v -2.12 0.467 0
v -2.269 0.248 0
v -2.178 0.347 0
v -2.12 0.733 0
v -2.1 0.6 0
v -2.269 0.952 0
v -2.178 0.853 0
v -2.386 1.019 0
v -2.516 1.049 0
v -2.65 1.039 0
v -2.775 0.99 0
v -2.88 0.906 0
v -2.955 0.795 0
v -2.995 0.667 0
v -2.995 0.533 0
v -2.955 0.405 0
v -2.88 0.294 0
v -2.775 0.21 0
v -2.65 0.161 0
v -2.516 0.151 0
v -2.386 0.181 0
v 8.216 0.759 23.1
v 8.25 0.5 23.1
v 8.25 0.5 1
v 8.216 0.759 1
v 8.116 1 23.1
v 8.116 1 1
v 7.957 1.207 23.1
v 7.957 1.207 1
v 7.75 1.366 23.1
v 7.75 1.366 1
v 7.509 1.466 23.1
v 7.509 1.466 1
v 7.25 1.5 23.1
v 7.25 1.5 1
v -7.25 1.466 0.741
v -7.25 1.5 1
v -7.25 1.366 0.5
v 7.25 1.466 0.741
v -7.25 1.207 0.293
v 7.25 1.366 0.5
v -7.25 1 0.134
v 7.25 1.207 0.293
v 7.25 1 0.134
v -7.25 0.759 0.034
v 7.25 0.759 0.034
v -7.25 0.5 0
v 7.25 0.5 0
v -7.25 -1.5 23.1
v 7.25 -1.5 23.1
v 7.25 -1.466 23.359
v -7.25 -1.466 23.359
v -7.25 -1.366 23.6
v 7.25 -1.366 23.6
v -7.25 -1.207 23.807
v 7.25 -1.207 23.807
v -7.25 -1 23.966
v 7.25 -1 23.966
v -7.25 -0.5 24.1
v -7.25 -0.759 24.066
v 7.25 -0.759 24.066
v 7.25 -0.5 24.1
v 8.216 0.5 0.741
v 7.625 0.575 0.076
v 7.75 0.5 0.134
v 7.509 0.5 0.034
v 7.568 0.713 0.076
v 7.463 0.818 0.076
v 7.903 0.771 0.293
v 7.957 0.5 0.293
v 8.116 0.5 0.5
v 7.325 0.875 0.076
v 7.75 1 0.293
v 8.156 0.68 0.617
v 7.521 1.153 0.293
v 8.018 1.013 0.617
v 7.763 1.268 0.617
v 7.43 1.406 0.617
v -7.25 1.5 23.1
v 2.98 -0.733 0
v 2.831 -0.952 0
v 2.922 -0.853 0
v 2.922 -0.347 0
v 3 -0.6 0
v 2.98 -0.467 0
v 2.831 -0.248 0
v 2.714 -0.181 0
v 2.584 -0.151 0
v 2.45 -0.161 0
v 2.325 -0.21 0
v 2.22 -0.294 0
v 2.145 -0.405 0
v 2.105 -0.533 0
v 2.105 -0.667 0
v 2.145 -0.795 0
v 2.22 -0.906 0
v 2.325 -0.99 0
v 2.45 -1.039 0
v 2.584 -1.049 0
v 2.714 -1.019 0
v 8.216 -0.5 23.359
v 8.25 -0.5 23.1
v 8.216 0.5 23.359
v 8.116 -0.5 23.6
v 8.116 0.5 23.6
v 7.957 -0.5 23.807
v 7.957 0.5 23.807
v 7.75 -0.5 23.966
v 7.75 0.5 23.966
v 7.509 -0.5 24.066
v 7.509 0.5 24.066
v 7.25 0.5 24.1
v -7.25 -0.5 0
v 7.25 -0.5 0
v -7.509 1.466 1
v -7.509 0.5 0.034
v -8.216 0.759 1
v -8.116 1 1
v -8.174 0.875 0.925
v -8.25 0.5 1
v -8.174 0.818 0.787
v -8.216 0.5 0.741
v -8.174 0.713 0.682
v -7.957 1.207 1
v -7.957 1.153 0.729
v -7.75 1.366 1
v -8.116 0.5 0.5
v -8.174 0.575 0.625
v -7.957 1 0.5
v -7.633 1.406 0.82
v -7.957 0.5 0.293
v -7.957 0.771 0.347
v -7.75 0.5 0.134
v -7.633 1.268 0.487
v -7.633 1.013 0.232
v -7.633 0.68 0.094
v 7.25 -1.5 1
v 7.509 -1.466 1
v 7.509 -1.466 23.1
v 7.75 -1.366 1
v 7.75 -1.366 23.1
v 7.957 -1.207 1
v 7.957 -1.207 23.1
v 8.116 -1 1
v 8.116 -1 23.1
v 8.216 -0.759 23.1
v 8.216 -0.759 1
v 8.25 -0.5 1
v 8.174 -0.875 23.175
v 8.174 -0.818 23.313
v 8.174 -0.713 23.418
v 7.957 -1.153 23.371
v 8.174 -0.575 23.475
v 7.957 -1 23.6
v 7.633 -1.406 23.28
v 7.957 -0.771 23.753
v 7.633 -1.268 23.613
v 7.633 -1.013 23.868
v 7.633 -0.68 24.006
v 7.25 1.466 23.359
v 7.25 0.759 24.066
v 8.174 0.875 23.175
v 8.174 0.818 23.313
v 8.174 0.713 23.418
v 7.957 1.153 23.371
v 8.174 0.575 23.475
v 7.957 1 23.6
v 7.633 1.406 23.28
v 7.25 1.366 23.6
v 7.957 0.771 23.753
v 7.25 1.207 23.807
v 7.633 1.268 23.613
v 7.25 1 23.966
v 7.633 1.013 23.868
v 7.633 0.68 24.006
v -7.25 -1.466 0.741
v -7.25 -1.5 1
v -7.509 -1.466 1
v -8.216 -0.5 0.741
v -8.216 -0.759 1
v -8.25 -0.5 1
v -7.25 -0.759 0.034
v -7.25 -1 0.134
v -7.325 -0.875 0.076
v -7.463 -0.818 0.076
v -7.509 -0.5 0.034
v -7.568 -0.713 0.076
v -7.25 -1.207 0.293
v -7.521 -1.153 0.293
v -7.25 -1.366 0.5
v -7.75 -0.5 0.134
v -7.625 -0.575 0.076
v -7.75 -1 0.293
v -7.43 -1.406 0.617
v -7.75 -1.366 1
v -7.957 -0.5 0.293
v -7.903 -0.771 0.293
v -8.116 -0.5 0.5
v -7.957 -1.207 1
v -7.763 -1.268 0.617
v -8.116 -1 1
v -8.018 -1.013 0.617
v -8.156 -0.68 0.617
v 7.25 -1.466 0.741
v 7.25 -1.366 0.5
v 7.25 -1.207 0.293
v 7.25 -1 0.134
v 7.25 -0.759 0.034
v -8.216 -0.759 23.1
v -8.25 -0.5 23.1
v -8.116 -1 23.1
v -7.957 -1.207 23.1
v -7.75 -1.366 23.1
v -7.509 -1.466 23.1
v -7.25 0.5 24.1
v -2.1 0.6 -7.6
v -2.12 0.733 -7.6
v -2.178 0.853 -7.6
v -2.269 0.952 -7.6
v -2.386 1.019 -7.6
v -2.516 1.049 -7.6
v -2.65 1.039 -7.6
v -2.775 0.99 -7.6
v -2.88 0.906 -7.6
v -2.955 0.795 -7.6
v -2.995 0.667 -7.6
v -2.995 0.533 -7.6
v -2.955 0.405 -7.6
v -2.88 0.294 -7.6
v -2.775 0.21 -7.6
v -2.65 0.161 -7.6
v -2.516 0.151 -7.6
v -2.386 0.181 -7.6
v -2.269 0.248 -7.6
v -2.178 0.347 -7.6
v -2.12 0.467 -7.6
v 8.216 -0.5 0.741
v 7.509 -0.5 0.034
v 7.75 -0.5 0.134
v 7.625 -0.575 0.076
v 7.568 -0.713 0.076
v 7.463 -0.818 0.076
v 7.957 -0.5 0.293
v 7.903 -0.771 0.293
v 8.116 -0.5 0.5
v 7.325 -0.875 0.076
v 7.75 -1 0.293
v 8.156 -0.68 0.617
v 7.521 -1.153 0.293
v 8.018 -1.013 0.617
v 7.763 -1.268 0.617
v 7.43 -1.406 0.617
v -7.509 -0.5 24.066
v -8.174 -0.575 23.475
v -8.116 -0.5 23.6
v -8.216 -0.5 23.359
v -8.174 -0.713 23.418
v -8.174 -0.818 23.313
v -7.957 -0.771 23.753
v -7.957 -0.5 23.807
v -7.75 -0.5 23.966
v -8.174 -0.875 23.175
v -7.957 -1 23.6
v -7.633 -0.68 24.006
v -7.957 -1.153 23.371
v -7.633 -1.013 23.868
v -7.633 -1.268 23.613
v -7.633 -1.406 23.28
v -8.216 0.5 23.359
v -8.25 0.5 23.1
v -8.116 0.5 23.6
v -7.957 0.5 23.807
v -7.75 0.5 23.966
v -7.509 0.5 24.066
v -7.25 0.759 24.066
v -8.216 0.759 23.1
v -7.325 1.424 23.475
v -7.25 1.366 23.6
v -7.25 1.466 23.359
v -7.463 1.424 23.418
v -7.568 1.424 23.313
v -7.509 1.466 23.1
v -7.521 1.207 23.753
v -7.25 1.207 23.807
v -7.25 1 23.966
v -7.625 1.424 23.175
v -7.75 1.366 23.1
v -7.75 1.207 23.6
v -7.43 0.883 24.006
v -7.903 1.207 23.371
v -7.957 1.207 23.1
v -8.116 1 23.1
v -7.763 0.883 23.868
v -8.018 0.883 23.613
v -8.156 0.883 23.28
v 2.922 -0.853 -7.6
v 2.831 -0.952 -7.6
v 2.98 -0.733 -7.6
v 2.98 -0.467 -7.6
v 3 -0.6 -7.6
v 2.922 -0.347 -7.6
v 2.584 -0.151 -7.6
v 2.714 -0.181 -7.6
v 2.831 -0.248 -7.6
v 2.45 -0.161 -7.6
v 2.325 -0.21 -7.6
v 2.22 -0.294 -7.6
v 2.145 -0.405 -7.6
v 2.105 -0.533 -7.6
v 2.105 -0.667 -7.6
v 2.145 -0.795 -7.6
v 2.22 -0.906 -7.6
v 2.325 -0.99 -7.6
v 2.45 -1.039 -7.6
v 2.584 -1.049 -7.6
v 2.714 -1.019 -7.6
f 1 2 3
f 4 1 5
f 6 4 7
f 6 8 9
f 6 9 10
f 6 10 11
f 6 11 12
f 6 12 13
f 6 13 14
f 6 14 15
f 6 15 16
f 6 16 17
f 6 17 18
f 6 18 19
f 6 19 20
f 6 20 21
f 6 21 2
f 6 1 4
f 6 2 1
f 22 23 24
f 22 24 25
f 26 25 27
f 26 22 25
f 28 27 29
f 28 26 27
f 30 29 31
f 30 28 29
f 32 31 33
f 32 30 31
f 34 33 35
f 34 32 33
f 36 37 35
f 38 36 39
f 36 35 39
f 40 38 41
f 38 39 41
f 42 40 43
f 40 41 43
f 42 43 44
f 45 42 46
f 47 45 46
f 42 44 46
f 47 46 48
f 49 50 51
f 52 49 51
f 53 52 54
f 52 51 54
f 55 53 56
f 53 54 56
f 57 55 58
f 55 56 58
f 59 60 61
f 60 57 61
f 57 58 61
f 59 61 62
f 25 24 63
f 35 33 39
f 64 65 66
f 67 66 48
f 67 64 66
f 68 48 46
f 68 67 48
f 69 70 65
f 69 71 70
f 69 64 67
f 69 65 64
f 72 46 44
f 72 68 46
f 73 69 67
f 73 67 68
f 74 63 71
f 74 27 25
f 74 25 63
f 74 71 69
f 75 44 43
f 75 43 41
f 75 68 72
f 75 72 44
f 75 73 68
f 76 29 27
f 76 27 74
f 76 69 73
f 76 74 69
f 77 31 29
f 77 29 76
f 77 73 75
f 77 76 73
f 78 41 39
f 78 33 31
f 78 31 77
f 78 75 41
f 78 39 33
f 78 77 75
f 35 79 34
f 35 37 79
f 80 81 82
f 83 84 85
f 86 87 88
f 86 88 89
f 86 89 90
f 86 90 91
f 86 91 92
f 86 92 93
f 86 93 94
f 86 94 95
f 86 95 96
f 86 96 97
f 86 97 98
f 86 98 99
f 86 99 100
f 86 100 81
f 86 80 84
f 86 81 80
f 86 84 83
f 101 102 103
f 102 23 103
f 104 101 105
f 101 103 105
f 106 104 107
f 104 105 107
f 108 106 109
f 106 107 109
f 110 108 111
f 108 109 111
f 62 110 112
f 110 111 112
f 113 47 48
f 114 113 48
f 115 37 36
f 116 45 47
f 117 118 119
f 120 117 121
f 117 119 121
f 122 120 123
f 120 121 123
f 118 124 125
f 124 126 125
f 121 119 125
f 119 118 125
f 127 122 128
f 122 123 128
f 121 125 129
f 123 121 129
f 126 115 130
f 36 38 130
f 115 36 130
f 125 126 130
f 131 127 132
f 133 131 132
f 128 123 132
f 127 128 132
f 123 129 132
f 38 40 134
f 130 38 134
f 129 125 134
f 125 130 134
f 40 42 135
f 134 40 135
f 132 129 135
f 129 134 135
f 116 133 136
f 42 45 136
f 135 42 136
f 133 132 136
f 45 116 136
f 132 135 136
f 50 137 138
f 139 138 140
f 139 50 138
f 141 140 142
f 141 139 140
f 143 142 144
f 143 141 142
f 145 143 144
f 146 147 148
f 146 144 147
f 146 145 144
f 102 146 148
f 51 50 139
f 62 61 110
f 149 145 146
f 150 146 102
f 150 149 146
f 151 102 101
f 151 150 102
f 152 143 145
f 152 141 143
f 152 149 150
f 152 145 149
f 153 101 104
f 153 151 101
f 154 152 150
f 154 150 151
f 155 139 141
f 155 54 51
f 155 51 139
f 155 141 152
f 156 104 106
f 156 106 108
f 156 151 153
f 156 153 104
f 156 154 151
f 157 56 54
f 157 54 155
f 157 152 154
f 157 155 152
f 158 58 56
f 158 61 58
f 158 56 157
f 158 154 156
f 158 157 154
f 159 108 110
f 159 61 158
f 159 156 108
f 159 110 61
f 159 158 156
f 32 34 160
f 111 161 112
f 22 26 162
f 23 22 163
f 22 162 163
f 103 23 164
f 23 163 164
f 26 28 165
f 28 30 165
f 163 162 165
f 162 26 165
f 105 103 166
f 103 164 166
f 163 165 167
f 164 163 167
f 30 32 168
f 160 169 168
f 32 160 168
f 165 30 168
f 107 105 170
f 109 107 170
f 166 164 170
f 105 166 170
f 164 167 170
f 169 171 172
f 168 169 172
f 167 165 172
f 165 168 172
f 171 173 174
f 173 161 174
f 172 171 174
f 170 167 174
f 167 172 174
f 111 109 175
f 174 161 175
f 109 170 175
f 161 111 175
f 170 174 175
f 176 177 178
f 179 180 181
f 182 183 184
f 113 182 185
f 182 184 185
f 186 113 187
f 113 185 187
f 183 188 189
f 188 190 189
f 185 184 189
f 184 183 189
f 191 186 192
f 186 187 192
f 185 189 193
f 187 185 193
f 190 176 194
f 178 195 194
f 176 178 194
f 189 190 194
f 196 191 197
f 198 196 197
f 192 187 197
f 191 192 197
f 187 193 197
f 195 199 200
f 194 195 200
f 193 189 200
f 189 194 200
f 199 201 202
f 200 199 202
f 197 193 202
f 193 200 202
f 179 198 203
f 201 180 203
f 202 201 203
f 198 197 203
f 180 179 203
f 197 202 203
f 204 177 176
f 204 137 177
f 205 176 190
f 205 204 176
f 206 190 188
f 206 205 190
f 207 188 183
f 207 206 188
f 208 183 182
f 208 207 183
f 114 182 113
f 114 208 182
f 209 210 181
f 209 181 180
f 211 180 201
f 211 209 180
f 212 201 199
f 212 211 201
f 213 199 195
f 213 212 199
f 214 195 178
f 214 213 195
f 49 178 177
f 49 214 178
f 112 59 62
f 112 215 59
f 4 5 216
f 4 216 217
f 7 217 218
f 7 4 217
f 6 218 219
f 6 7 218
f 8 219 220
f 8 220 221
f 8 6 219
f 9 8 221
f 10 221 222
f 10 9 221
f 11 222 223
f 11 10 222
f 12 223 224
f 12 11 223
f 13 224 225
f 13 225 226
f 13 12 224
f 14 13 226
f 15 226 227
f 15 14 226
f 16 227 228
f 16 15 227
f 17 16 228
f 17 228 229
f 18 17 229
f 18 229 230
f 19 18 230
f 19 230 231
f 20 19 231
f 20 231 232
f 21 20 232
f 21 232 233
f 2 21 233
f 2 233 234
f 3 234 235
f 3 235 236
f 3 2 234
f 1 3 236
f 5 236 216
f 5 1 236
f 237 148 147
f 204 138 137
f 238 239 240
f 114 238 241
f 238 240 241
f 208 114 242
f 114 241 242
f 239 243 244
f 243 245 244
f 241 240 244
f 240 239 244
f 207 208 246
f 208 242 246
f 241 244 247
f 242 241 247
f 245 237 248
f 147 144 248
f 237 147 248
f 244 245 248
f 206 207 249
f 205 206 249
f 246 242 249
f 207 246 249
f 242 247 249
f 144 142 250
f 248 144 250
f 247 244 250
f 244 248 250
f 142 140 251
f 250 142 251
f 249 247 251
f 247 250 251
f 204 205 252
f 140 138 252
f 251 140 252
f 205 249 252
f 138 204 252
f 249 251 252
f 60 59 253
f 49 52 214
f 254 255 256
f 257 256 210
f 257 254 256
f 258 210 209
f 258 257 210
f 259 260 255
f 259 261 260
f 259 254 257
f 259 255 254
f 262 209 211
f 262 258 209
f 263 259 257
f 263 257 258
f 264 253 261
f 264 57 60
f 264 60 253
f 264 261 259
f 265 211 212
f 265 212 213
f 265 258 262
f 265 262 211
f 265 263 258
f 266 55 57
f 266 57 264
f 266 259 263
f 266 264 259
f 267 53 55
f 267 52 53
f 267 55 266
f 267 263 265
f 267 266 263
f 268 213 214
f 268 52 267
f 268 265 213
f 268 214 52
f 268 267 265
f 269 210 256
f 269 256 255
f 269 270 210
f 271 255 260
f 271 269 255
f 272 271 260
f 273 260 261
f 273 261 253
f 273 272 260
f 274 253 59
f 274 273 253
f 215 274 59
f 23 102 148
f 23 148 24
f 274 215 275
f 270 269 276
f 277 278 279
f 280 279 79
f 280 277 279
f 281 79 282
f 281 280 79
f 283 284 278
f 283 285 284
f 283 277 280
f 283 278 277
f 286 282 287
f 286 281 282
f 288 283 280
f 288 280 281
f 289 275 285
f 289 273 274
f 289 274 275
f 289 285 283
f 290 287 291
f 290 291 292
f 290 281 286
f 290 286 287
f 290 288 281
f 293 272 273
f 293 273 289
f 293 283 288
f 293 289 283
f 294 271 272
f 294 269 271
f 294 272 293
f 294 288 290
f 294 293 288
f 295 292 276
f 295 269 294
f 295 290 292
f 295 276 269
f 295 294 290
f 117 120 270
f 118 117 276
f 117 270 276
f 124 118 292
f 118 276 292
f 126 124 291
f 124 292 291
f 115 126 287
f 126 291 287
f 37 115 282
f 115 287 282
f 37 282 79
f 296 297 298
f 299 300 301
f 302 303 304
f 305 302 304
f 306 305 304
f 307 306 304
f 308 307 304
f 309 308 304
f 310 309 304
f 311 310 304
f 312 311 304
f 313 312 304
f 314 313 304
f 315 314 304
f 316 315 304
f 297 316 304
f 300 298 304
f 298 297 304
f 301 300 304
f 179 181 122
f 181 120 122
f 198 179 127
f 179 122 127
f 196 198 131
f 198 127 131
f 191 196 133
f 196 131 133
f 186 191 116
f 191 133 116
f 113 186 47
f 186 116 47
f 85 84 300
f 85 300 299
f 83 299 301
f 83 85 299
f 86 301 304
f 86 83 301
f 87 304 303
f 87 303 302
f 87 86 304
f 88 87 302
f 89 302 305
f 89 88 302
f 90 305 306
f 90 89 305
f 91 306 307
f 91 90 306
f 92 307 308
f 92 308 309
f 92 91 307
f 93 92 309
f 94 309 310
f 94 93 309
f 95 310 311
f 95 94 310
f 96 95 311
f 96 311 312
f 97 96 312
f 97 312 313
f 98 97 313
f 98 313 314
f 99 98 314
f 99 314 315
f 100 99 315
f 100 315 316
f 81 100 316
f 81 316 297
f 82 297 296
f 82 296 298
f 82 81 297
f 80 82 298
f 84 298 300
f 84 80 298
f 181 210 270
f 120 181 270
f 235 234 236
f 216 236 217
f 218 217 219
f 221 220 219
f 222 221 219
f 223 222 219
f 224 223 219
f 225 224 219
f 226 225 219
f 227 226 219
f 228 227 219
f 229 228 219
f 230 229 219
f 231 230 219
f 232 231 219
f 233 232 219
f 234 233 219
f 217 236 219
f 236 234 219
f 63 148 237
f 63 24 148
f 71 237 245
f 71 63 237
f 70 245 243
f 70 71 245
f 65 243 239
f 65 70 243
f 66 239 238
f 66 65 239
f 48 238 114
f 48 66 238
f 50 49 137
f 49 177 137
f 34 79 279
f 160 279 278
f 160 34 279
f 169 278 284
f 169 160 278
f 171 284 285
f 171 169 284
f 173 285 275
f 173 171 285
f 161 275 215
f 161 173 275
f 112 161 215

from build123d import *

# Parameters (mm, degrees)
SKETCH_R     = 0.45
PAD_DEPTH    = 7.6
SKETCH001_W  = 16.5
SKETCH001_H  = 3
PAD001_DEPTH = 24.1
FILLET_R     = 1


with BuildPart() as piny:
    # Sketch → Pad (new body)
    with BuildSketch(Plane.XY):
        with Locations((2.55, -0.6)):
            Circle(SKETCH_R)
        with Locations((-2.55, 0.6)):
            Circle(SKETCH_R)
    extrude(amount=-PAD_DEPTH)


with BuildPart() as korpus001:
    # Sketch001 → Pad001 (new body)
    with BuildSketch(Plane.XY):
        Rectangle(SKETCH001_W, SKETCH001_H)
    extrude(amount=PAD001_DEPTH)

    # Fillet
    fillet_edges = [korpus001.edges().sort_by_distance(p)[0] for p in [
        (0, -1.5, 24.1),
        (-8.25, 0, 24.1),
        (0, 1.5, 24.1),
        (8.25, -1.5, 12.05),
        (8.25, 1.5, 12.05),
        (-8.25, -1.5, 12.05),
        (8.25, 0, 0),
        (0, -1.5, 0),
        (8.25, 0, 24.1),
        (0, 1.5, 0),
        (-8.25, 1.5, 12.05),
        (-8.25, 0, 0),
    ]]
    fillet(fillet_edges, radius=FILLET_R)


solid = Compound([piny.part, korpus001.part])
